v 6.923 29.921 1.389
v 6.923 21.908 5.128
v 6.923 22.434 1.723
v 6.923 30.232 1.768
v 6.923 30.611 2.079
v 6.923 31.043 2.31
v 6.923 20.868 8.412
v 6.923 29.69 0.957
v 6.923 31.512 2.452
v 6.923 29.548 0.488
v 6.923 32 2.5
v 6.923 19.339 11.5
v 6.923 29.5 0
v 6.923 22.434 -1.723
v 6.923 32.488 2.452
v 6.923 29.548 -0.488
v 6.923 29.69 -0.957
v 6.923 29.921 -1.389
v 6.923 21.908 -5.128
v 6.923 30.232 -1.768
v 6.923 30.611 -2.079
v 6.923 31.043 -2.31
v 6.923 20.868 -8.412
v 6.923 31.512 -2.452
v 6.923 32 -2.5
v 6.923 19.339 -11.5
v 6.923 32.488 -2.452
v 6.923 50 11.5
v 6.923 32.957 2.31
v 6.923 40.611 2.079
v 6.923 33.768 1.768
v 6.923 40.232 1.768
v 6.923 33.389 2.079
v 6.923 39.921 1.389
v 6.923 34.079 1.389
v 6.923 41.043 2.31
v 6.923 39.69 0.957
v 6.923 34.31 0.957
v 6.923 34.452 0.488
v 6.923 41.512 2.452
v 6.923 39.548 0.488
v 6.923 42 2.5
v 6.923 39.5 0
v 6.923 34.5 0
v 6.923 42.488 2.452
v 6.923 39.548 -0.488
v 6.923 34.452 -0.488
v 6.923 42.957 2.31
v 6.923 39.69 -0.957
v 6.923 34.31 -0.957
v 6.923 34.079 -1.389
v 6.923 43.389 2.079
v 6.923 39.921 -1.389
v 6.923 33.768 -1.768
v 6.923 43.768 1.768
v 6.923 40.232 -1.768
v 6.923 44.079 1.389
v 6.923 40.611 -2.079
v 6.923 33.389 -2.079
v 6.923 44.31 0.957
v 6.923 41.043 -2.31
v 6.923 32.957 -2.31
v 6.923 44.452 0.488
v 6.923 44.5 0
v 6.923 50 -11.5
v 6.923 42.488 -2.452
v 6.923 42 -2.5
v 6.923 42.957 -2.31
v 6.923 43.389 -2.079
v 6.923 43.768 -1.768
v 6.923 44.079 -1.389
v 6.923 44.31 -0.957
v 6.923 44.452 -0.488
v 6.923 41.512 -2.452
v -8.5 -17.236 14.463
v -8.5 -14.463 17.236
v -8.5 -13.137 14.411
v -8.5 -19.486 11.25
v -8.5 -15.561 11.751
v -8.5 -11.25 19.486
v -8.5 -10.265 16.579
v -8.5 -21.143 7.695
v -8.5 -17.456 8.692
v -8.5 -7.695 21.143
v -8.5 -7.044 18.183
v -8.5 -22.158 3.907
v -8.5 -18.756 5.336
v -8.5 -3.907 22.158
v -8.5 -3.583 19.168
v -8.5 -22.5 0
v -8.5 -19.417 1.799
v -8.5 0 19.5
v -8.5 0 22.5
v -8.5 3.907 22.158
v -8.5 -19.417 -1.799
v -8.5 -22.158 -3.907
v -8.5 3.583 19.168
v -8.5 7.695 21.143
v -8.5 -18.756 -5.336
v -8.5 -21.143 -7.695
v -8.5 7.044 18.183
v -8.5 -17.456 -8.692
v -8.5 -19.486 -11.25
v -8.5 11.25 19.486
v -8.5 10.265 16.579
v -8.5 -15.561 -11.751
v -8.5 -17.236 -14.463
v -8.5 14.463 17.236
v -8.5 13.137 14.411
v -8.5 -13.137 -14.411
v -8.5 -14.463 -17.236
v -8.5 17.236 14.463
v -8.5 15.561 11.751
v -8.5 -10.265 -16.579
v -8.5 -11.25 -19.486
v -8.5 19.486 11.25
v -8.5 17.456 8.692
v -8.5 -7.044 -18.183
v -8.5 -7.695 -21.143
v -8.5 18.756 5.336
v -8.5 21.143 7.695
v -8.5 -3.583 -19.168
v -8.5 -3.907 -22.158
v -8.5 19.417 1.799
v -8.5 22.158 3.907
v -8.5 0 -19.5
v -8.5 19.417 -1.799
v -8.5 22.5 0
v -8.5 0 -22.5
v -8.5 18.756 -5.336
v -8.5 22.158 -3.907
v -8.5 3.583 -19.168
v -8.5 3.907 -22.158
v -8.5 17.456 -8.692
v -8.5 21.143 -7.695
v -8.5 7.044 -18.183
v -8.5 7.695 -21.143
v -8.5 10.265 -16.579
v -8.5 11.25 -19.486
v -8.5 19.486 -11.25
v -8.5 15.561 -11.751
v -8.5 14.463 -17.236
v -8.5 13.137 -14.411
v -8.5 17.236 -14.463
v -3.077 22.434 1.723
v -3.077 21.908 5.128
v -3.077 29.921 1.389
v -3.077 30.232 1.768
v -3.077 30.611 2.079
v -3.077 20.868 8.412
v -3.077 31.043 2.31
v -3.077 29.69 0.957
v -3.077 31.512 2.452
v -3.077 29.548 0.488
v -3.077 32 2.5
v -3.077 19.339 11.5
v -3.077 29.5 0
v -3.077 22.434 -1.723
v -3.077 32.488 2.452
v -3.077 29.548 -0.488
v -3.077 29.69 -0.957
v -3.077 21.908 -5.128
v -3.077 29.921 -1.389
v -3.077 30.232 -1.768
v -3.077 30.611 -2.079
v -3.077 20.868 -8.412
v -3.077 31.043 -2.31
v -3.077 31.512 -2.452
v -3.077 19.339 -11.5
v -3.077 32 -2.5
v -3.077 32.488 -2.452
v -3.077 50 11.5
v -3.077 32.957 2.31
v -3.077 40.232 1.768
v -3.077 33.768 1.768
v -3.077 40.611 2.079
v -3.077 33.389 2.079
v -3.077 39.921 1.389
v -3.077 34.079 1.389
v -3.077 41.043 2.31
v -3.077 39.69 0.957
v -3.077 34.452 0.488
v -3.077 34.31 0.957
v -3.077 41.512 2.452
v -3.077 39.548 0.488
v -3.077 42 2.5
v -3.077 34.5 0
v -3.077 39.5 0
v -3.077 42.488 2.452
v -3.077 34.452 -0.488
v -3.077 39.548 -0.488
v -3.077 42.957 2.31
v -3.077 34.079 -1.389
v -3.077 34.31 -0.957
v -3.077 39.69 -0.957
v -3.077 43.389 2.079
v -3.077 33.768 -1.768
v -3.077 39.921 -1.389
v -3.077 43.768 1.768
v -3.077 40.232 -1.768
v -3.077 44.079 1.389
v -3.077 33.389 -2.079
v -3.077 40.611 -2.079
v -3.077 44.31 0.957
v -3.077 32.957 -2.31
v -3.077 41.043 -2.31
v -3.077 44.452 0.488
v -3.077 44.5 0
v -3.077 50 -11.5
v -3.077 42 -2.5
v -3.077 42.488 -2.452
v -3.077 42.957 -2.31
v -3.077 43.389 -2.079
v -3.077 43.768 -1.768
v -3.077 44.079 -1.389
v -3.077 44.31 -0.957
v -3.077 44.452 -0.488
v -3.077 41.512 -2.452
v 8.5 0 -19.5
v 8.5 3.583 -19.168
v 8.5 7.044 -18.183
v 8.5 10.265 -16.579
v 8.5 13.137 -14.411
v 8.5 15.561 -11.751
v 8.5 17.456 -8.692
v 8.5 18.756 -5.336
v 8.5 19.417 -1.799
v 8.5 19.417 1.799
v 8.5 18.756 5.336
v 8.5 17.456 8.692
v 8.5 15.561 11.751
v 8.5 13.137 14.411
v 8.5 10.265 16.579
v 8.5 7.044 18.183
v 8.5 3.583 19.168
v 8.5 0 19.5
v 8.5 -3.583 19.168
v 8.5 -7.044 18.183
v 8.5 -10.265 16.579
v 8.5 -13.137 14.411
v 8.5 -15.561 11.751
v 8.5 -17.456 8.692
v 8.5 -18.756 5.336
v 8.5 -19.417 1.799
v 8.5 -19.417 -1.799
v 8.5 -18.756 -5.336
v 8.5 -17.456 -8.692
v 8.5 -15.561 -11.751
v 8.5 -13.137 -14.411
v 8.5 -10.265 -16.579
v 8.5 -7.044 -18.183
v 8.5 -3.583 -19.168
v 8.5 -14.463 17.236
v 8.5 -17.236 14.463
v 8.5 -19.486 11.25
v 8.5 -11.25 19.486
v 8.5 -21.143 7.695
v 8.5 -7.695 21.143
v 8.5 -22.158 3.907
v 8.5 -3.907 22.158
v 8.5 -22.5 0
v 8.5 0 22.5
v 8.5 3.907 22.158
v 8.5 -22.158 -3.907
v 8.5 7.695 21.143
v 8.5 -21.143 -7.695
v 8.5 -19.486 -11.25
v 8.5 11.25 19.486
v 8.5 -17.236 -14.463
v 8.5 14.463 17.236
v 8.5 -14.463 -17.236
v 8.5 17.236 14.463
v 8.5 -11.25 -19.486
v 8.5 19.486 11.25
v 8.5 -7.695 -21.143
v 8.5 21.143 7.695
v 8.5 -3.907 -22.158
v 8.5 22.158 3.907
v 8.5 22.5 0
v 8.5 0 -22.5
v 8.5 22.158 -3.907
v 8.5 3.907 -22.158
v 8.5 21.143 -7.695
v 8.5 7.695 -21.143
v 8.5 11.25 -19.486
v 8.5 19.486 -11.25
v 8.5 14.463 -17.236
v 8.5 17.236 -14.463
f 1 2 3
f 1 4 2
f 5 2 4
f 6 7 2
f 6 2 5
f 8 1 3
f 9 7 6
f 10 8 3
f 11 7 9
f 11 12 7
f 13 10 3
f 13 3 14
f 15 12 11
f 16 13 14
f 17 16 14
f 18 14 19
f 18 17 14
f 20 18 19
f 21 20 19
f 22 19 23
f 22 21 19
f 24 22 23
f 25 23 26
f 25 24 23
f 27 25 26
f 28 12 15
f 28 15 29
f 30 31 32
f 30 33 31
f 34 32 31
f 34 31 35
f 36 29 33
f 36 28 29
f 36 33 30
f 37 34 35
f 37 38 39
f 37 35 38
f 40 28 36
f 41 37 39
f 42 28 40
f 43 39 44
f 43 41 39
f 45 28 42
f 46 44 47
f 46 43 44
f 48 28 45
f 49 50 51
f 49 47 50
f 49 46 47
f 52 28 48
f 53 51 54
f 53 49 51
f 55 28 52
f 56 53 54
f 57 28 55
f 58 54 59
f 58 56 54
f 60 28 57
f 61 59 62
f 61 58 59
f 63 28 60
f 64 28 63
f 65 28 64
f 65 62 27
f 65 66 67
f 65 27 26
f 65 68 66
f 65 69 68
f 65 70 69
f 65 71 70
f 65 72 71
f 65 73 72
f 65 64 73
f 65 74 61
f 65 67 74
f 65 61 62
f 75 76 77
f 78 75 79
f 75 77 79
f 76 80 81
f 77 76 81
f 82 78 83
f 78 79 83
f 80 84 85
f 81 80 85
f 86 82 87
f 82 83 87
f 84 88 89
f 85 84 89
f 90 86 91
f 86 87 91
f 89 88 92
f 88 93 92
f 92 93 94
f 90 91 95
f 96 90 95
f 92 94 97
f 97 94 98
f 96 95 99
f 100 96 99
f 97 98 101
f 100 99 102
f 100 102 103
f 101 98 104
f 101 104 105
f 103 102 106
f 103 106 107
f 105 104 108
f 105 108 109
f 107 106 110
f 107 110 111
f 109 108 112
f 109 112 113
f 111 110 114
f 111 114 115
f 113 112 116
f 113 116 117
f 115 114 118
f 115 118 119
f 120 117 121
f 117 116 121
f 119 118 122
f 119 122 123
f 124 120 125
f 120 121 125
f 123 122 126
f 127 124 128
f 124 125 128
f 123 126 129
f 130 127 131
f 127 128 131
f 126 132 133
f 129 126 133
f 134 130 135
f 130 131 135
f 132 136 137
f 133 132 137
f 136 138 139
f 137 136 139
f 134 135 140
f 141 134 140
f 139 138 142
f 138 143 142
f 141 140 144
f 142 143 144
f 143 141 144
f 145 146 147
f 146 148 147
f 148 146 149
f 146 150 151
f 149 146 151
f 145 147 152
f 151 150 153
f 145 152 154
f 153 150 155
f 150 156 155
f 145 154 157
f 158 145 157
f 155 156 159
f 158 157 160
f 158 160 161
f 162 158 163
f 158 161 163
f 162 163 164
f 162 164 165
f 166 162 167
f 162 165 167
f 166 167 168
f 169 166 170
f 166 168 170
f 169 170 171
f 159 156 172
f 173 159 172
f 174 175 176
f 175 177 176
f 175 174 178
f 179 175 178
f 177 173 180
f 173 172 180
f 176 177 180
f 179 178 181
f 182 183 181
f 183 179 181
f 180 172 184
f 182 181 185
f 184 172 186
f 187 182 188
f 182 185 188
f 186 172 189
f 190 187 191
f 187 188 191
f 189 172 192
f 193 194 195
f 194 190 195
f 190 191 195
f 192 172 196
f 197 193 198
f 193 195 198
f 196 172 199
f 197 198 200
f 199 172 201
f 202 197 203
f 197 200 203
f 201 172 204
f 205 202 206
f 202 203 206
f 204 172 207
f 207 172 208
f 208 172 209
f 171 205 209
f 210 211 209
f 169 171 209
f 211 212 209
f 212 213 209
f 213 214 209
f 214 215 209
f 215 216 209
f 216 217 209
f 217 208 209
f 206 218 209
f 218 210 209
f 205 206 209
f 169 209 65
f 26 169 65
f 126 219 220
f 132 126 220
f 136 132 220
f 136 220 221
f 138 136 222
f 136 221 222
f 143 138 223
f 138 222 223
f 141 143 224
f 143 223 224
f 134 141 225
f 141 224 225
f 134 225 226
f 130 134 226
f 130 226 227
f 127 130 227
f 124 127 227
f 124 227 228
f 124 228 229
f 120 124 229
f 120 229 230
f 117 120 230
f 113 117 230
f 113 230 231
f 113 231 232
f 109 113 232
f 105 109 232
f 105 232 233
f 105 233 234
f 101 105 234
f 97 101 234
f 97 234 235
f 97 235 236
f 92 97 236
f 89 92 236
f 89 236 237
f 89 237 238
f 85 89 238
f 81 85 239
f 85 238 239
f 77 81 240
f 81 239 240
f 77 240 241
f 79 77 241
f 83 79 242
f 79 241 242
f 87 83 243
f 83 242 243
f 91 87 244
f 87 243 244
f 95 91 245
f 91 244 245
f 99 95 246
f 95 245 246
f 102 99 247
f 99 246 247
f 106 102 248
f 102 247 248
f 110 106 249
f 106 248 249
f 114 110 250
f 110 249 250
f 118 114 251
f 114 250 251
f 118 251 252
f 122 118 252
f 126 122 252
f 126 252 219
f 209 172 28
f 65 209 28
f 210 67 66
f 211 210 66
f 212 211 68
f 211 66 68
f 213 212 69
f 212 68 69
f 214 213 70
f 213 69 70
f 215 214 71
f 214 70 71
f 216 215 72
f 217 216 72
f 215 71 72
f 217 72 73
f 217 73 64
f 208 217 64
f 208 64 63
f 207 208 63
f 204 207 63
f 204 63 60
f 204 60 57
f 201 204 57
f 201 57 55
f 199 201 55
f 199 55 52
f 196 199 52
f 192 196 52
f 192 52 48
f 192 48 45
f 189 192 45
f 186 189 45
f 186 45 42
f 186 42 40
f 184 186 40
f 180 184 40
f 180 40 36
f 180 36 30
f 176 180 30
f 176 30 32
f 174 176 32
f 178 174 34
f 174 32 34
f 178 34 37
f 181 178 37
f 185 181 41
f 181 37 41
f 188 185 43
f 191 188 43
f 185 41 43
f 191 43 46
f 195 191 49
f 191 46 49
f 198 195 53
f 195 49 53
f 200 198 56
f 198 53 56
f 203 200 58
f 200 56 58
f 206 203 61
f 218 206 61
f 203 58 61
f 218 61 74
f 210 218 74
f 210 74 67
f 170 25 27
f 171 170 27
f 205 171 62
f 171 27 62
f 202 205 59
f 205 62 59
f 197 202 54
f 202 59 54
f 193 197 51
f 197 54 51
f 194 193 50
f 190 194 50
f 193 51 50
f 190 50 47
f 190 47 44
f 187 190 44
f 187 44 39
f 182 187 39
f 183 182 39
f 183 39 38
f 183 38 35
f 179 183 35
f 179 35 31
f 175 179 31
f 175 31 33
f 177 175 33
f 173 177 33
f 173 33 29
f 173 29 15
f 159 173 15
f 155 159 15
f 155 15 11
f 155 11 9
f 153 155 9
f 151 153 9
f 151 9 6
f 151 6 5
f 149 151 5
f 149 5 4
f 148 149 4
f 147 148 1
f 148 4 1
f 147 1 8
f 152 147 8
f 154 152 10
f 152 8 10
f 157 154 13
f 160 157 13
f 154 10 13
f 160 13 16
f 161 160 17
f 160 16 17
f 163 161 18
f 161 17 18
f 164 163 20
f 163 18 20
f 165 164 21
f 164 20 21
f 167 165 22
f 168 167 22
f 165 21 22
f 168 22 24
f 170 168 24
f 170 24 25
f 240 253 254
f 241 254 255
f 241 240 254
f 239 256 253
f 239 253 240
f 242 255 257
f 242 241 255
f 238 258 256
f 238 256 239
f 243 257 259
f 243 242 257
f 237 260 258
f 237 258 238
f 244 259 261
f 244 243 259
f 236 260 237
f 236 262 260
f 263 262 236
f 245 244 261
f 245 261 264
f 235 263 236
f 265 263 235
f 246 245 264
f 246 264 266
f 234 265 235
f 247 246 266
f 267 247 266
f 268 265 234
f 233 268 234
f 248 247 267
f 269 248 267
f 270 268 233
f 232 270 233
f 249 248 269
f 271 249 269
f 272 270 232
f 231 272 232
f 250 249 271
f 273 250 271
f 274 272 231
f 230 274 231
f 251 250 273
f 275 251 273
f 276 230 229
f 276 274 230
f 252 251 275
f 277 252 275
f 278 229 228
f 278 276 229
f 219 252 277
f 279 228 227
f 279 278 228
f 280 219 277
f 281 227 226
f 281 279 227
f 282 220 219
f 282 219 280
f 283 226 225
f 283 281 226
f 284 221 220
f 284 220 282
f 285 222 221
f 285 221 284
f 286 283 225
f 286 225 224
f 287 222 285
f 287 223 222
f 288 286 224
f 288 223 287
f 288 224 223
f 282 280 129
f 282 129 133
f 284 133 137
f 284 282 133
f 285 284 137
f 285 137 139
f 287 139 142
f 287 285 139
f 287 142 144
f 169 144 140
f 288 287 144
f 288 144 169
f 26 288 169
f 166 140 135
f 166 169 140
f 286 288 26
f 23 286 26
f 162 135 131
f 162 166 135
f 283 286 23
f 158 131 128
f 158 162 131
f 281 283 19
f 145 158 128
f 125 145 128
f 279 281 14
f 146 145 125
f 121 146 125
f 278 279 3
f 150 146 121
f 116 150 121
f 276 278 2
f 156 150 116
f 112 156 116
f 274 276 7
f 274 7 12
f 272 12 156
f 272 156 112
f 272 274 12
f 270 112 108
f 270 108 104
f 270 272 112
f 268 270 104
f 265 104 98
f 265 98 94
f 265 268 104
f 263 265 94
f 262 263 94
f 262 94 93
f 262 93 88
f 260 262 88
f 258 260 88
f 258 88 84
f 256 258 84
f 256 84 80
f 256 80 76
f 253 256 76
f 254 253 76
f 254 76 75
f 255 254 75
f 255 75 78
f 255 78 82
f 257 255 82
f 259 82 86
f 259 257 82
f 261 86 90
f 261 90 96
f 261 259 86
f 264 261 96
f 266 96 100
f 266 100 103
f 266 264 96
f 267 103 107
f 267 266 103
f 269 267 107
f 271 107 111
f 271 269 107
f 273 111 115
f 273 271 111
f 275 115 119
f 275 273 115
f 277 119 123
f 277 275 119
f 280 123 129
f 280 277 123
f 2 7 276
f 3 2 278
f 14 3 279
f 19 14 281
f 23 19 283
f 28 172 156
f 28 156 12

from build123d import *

# Parameters (mm, degrees)
SKETCH2_R                = 22.5
BOSS_EXTRUDE1_DEPTH      = 8.5
BOSS_EXTRUDE2_REACH      = 78.386
BOSS_EXTRUDE2_END_RADIUS = 22.5
SKETCH3_W                = 10
SKETCH3_H                = 23
SKETCH8_R                = 2.5
CUT_EXTRUDE1_DEPTH       = 57.95722287
SKETCH11_R               = 19.5
CUT_EXTRUDE2_DEPTH       = 58.404268134


with BuildPart() as part:
    # Sketch2 → Boss-Extrude1 (new, symmetric)
    with BuildSketch(Plane(origin=(0, 0, 0), x_dir=(0, 0, -1), z_dir=(1, 0, 0))):
        Circle(SKETCH2_R)
    extrude(amount=BOSS_EXTRUDE1_DEPTH, both=True)

    # Boss-Extrude2: up to this cylinder (the profile starts outside it)
    boss_extrude2_end = Plane(origin=(1.923205, 0, 0), z_dir=(-1, 0, 0)) * Cylinder(BOSS_EXTRUDE2_END_RADIUS, 202.772, mode=Mode.PRIVATE)
    # Sketch3 → Boss-Extrude2 (add, up to the surface)
    with BuildSketch(Plane(origin=(0, 50, 0), x_dir=(1, 0, 0), z_dir=(0, 1, 0)), mode=Mode.PRIVATE) as boss_extrude2_sk1:
        with Locations((1.9232045, 0)):
            Rectangle(SKETCH3_W, SKETCH3_H)
    boss_extrude2_tool1 = extrude(boss_extrude2_sk1.sketch, amount=-BOSS_EXTRUDE2_REACH, mode=Mode.PRIVATE) - boss_extrude2_end
    add(boss_extrude2_tool1.solids().sort_by_distance((1.923205, 50, 0))[0])

    # Sketch8 → Cut-Extrude1 (cut, through all)
    with BuildSketch(Plane(origin=(6.9232045, 0, 0), x_dir=(0, 0, -1), z_dir=(1, 0, 0))):
        with Locations((0, 42)):
            Circle(SKETCH8_R)
        with Locations((0, 32)):
            Circle(SKETCH8_R)
    extrude(amount=-CUT_EXTRUDE1_DEPTH, mode=Mode.SUBTRACT)

    # Sketch11 → Cut-Extrude2 (cut, through all)
    with BuildSketch(Plane(origin=(8.5, 0, 0), x_dir=(0, 0, -1), z_dir=(1, 0, 0))):
        Circle(SKETCH11_R)
    extrude(amount=-CUT_EXTRUDE2_DEPTH, mode=Mode.SUBTRACT)


solid = part.part
